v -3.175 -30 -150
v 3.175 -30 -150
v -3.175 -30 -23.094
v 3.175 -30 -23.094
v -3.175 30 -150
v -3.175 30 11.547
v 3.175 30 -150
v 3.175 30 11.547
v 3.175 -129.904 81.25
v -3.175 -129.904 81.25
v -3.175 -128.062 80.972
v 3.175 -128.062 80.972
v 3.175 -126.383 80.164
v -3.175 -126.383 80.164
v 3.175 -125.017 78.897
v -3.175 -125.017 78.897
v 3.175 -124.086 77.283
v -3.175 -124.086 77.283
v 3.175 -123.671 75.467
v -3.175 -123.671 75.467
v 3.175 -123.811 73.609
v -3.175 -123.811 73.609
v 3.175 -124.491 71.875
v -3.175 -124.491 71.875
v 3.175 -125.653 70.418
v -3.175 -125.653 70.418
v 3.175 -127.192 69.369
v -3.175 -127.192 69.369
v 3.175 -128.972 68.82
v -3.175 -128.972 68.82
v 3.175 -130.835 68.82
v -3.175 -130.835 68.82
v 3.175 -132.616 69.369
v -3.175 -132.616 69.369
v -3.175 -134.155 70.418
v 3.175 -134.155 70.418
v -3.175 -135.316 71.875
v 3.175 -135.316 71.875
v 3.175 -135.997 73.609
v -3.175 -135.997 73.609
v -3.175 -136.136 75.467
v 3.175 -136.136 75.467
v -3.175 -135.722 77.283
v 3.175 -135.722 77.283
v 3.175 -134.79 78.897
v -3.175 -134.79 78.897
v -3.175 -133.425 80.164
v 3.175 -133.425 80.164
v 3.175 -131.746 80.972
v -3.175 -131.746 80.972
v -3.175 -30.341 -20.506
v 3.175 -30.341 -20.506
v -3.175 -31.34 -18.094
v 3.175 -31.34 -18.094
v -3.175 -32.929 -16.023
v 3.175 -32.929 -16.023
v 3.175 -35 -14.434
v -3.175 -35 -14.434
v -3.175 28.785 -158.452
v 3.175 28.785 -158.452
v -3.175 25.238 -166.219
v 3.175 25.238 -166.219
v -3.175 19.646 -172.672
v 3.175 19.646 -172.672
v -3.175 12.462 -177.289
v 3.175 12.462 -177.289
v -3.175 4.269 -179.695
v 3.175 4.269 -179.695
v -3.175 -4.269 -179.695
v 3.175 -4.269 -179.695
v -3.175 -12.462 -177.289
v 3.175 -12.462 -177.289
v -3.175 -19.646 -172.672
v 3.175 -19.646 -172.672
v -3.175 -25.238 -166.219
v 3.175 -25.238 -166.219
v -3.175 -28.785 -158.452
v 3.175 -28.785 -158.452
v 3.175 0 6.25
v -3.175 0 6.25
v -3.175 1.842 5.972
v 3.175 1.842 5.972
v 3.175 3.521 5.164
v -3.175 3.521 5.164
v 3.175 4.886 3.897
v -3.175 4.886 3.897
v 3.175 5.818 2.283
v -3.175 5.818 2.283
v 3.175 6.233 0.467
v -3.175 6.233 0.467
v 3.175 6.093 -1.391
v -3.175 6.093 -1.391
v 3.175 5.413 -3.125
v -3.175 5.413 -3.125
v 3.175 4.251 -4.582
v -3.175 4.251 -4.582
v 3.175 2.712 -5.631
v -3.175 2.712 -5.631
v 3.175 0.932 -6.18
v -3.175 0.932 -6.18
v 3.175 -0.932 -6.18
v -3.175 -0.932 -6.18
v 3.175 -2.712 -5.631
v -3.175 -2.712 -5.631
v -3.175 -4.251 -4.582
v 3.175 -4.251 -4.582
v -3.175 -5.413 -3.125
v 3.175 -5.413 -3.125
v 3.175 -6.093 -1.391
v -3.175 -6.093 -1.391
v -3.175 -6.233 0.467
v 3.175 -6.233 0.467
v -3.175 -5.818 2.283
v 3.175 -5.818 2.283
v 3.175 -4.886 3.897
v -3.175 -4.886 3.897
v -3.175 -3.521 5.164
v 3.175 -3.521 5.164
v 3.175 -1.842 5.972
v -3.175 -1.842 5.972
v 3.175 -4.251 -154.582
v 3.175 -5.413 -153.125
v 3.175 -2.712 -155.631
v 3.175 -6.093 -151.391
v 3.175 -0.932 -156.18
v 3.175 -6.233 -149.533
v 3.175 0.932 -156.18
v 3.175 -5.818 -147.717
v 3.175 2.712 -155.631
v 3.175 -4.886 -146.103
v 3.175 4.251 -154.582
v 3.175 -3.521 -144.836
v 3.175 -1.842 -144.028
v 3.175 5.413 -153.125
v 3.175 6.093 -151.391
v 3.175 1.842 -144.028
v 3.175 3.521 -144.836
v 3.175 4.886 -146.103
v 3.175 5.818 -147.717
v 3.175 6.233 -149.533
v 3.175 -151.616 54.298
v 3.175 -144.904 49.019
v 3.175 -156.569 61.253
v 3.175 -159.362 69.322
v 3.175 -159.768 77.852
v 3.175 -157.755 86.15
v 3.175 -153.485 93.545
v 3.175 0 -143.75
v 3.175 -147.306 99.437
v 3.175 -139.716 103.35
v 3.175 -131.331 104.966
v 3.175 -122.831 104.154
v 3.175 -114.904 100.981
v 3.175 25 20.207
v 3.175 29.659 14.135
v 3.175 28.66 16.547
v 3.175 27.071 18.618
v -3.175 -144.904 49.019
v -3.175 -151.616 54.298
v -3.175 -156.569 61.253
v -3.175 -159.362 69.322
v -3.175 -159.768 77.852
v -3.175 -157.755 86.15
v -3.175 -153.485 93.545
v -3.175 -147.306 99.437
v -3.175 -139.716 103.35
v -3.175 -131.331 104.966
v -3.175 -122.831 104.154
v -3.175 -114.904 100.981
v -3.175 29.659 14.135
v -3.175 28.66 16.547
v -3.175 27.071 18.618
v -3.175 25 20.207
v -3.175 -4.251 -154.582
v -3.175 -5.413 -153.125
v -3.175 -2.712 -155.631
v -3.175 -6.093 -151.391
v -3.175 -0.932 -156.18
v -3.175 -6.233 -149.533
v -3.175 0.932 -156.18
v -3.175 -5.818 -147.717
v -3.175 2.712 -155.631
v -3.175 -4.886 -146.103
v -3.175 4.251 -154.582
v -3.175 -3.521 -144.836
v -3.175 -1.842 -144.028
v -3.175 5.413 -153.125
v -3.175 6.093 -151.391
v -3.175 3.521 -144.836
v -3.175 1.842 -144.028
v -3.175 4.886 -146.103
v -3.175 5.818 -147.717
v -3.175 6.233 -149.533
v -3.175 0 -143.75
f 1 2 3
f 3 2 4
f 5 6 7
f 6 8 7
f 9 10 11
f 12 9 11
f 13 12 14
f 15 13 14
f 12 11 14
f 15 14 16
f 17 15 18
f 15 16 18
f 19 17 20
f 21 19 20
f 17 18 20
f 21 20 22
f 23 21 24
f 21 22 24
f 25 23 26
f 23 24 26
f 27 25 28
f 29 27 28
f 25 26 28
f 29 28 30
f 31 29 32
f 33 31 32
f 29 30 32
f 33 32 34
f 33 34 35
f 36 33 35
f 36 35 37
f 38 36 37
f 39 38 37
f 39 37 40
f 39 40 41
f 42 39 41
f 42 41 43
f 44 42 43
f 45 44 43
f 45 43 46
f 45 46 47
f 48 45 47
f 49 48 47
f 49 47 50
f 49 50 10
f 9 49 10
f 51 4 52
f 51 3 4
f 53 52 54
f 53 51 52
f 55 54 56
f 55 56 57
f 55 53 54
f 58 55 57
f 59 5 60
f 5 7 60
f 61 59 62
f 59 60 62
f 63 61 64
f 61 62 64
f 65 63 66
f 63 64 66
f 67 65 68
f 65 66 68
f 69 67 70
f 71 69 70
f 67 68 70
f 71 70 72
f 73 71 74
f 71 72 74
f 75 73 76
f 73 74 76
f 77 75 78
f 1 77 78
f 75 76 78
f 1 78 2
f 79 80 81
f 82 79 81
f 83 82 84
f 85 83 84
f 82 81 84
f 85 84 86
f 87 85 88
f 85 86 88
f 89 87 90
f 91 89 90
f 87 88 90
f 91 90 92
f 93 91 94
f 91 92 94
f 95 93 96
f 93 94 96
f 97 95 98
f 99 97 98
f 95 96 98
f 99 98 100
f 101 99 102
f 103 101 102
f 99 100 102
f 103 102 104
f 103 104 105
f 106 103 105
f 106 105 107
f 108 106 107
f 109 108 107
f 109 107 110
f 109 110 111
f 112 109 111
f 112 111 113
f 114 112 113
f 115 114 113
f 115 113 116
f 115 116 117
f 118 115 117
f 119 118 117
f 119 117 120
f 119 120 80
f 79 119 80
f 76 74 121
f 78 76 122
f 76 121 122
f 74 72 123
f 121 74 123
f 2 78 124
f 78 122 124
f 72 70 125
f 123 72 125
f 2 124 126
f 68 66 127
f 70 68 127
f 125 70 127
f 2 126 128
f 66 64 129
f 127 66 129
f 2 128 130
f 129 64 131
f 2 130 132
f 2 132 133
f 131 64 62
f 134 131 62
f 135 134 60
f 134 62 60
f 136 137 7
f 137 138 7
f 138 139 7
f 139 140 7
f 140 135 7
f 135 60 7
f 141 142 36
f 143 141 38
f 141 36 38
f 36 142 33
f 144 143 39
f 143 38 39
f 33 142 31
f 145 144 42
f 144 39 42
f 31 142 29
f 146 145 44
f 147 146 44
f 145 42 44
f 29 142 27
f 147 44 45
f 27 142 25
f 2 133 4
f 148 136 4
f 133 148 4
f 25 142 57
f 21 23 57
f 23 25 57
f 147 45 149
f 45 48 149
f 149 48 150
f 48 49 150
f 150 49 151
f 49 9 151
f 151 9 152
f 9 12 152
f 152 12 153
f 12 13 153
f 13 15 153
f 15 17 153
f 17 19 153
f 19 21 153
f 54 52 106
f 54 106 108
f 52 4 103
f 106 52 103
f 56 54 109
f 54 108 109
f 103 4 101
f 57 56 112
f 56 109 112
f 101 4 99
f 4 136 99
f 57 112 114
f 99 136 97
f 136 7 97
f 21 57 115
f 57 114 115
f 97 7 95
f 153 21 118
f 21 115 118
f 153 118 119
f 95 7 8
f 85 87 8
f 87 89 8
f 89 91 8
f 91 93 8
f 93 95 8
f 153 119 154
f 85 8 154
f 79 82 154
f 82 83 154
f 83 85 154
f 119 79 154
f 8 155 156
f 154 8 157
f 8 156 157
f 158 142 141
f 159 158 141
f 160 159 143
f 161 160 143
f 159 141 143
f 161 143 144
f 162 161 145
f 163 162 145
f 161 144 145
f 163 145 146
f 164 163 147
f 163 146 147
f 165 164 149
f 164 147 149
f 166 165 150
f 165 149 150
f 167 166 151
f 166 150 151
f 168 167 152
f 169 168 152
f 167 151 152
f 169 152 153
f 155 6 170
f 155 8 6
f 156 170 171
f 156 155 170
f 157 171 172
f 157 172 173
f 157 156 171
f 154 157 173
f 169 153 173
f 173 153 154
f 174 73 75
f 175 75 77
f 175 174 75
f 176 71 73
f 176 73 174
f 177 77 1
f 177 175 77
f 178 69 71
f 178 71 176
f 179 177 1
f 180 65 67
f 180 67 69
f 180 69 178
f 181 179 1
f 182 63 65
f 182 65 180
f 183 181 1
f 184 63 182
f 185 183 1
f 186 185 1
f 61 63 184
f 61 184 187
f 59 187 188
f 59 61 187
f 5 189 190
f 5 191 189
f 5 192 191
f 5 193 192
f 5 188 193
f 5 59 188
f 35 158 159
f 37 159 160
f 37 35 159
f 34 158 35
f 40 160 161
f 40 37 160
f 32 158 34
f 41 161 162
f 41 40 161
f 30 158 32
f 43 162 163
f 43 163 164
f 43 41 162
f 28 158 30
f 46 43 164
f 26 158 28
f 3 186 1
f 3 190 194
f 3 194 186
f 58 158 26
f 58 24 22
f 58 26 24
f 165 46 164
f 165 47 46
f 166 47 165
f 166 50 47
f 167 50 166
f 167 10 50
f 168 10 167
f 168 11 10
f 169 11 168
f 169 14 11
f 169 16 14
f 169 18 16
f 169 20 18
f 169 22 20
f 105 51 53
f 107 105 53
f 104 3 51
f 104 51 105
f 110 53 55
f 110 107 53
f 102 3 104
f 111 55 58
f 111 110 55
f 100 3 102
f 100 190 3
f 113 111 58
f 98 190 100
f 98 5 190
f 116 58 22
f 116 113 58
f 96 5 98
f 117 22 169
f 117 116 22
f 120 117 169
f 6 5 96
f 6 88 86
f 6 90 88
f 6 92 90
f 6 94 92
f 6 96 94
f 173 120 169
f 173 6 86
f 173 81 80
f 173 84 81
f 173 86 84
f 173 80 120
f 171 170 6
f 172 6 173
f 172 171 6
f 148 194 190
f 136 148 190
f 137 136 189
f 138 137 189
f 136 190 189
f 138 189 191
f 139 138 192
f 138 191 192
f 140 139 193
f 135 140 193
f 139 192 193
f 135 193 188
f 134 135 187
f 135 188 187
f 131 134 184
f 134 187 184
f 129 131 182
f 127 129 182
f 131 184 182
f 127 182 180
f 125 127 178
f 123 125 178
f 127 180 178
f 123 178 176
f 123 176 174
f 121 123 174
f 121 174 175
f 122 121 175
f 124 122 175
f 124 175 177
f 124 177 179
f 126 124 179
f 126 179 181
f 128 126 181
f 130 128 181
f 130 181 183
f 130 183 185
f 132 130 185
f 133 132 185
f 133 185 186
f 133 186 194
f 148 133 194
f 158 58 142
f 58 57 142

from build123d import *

# Parameters (mm, degrees)
SALIENTE_EXTRUIR1_DEPTH          = 3.175
DI_METRO_DE_TALADRO_6_0_12_5_1_D = 12.5
REDONDEO1_R                      = 10


with BuildPart() as part:
    # Croquis1 → Saliente-Extruir1 (new, symmetric)
    with BuildSketch(Plane(origin=(0, 0, 0), x_dir=(0, 0, -1), z_dir=(1, 0, 0))):
        with BuildLine():
            Line((-17.320508076, 30), (150, 30))
            ThreePointArc((150, 30), (180, 0), (150, -30))
            Line((150, -30), (17.320508076, -30))
            Line((17.320508076, -30), (-49.019237886, -144.903810568))
            ThreePointArc((-49.019237886, -144.903810568), (-90, -155.884572681), (-100.980762114, -114.903810568))
            Line((-100.980762114, -114.903810568), (-17.320508076, 30))
        make_face()
    extrude(amount=SALIENTE_EXTRUIR1_DEPTH, both=True)

    # Diámetro de taladro Ø6.0 (12.5)1 (through all)
    with Locations(Plane(origin=(3.175, 0, 0), x_dir=(0, 0, -1), z_dir=(1, 0, 0))):
        with Locations((0, 0), (-75, -129.903810568), (150, 0)):
            Hole(DI_METRO_DE_TALADRO_6_0_12_5_1_D / 2)

    # Redondeo1
    redondeo1_edges = [part.edges().sort_by_distance(p)[0] for p in [
        (0, 30, 17.320508076),
        (0, -30, -17.320508076),
    ]]
    fillet(redondeo1_edges, radius=REDONDEO1_R)


solid = part.part
